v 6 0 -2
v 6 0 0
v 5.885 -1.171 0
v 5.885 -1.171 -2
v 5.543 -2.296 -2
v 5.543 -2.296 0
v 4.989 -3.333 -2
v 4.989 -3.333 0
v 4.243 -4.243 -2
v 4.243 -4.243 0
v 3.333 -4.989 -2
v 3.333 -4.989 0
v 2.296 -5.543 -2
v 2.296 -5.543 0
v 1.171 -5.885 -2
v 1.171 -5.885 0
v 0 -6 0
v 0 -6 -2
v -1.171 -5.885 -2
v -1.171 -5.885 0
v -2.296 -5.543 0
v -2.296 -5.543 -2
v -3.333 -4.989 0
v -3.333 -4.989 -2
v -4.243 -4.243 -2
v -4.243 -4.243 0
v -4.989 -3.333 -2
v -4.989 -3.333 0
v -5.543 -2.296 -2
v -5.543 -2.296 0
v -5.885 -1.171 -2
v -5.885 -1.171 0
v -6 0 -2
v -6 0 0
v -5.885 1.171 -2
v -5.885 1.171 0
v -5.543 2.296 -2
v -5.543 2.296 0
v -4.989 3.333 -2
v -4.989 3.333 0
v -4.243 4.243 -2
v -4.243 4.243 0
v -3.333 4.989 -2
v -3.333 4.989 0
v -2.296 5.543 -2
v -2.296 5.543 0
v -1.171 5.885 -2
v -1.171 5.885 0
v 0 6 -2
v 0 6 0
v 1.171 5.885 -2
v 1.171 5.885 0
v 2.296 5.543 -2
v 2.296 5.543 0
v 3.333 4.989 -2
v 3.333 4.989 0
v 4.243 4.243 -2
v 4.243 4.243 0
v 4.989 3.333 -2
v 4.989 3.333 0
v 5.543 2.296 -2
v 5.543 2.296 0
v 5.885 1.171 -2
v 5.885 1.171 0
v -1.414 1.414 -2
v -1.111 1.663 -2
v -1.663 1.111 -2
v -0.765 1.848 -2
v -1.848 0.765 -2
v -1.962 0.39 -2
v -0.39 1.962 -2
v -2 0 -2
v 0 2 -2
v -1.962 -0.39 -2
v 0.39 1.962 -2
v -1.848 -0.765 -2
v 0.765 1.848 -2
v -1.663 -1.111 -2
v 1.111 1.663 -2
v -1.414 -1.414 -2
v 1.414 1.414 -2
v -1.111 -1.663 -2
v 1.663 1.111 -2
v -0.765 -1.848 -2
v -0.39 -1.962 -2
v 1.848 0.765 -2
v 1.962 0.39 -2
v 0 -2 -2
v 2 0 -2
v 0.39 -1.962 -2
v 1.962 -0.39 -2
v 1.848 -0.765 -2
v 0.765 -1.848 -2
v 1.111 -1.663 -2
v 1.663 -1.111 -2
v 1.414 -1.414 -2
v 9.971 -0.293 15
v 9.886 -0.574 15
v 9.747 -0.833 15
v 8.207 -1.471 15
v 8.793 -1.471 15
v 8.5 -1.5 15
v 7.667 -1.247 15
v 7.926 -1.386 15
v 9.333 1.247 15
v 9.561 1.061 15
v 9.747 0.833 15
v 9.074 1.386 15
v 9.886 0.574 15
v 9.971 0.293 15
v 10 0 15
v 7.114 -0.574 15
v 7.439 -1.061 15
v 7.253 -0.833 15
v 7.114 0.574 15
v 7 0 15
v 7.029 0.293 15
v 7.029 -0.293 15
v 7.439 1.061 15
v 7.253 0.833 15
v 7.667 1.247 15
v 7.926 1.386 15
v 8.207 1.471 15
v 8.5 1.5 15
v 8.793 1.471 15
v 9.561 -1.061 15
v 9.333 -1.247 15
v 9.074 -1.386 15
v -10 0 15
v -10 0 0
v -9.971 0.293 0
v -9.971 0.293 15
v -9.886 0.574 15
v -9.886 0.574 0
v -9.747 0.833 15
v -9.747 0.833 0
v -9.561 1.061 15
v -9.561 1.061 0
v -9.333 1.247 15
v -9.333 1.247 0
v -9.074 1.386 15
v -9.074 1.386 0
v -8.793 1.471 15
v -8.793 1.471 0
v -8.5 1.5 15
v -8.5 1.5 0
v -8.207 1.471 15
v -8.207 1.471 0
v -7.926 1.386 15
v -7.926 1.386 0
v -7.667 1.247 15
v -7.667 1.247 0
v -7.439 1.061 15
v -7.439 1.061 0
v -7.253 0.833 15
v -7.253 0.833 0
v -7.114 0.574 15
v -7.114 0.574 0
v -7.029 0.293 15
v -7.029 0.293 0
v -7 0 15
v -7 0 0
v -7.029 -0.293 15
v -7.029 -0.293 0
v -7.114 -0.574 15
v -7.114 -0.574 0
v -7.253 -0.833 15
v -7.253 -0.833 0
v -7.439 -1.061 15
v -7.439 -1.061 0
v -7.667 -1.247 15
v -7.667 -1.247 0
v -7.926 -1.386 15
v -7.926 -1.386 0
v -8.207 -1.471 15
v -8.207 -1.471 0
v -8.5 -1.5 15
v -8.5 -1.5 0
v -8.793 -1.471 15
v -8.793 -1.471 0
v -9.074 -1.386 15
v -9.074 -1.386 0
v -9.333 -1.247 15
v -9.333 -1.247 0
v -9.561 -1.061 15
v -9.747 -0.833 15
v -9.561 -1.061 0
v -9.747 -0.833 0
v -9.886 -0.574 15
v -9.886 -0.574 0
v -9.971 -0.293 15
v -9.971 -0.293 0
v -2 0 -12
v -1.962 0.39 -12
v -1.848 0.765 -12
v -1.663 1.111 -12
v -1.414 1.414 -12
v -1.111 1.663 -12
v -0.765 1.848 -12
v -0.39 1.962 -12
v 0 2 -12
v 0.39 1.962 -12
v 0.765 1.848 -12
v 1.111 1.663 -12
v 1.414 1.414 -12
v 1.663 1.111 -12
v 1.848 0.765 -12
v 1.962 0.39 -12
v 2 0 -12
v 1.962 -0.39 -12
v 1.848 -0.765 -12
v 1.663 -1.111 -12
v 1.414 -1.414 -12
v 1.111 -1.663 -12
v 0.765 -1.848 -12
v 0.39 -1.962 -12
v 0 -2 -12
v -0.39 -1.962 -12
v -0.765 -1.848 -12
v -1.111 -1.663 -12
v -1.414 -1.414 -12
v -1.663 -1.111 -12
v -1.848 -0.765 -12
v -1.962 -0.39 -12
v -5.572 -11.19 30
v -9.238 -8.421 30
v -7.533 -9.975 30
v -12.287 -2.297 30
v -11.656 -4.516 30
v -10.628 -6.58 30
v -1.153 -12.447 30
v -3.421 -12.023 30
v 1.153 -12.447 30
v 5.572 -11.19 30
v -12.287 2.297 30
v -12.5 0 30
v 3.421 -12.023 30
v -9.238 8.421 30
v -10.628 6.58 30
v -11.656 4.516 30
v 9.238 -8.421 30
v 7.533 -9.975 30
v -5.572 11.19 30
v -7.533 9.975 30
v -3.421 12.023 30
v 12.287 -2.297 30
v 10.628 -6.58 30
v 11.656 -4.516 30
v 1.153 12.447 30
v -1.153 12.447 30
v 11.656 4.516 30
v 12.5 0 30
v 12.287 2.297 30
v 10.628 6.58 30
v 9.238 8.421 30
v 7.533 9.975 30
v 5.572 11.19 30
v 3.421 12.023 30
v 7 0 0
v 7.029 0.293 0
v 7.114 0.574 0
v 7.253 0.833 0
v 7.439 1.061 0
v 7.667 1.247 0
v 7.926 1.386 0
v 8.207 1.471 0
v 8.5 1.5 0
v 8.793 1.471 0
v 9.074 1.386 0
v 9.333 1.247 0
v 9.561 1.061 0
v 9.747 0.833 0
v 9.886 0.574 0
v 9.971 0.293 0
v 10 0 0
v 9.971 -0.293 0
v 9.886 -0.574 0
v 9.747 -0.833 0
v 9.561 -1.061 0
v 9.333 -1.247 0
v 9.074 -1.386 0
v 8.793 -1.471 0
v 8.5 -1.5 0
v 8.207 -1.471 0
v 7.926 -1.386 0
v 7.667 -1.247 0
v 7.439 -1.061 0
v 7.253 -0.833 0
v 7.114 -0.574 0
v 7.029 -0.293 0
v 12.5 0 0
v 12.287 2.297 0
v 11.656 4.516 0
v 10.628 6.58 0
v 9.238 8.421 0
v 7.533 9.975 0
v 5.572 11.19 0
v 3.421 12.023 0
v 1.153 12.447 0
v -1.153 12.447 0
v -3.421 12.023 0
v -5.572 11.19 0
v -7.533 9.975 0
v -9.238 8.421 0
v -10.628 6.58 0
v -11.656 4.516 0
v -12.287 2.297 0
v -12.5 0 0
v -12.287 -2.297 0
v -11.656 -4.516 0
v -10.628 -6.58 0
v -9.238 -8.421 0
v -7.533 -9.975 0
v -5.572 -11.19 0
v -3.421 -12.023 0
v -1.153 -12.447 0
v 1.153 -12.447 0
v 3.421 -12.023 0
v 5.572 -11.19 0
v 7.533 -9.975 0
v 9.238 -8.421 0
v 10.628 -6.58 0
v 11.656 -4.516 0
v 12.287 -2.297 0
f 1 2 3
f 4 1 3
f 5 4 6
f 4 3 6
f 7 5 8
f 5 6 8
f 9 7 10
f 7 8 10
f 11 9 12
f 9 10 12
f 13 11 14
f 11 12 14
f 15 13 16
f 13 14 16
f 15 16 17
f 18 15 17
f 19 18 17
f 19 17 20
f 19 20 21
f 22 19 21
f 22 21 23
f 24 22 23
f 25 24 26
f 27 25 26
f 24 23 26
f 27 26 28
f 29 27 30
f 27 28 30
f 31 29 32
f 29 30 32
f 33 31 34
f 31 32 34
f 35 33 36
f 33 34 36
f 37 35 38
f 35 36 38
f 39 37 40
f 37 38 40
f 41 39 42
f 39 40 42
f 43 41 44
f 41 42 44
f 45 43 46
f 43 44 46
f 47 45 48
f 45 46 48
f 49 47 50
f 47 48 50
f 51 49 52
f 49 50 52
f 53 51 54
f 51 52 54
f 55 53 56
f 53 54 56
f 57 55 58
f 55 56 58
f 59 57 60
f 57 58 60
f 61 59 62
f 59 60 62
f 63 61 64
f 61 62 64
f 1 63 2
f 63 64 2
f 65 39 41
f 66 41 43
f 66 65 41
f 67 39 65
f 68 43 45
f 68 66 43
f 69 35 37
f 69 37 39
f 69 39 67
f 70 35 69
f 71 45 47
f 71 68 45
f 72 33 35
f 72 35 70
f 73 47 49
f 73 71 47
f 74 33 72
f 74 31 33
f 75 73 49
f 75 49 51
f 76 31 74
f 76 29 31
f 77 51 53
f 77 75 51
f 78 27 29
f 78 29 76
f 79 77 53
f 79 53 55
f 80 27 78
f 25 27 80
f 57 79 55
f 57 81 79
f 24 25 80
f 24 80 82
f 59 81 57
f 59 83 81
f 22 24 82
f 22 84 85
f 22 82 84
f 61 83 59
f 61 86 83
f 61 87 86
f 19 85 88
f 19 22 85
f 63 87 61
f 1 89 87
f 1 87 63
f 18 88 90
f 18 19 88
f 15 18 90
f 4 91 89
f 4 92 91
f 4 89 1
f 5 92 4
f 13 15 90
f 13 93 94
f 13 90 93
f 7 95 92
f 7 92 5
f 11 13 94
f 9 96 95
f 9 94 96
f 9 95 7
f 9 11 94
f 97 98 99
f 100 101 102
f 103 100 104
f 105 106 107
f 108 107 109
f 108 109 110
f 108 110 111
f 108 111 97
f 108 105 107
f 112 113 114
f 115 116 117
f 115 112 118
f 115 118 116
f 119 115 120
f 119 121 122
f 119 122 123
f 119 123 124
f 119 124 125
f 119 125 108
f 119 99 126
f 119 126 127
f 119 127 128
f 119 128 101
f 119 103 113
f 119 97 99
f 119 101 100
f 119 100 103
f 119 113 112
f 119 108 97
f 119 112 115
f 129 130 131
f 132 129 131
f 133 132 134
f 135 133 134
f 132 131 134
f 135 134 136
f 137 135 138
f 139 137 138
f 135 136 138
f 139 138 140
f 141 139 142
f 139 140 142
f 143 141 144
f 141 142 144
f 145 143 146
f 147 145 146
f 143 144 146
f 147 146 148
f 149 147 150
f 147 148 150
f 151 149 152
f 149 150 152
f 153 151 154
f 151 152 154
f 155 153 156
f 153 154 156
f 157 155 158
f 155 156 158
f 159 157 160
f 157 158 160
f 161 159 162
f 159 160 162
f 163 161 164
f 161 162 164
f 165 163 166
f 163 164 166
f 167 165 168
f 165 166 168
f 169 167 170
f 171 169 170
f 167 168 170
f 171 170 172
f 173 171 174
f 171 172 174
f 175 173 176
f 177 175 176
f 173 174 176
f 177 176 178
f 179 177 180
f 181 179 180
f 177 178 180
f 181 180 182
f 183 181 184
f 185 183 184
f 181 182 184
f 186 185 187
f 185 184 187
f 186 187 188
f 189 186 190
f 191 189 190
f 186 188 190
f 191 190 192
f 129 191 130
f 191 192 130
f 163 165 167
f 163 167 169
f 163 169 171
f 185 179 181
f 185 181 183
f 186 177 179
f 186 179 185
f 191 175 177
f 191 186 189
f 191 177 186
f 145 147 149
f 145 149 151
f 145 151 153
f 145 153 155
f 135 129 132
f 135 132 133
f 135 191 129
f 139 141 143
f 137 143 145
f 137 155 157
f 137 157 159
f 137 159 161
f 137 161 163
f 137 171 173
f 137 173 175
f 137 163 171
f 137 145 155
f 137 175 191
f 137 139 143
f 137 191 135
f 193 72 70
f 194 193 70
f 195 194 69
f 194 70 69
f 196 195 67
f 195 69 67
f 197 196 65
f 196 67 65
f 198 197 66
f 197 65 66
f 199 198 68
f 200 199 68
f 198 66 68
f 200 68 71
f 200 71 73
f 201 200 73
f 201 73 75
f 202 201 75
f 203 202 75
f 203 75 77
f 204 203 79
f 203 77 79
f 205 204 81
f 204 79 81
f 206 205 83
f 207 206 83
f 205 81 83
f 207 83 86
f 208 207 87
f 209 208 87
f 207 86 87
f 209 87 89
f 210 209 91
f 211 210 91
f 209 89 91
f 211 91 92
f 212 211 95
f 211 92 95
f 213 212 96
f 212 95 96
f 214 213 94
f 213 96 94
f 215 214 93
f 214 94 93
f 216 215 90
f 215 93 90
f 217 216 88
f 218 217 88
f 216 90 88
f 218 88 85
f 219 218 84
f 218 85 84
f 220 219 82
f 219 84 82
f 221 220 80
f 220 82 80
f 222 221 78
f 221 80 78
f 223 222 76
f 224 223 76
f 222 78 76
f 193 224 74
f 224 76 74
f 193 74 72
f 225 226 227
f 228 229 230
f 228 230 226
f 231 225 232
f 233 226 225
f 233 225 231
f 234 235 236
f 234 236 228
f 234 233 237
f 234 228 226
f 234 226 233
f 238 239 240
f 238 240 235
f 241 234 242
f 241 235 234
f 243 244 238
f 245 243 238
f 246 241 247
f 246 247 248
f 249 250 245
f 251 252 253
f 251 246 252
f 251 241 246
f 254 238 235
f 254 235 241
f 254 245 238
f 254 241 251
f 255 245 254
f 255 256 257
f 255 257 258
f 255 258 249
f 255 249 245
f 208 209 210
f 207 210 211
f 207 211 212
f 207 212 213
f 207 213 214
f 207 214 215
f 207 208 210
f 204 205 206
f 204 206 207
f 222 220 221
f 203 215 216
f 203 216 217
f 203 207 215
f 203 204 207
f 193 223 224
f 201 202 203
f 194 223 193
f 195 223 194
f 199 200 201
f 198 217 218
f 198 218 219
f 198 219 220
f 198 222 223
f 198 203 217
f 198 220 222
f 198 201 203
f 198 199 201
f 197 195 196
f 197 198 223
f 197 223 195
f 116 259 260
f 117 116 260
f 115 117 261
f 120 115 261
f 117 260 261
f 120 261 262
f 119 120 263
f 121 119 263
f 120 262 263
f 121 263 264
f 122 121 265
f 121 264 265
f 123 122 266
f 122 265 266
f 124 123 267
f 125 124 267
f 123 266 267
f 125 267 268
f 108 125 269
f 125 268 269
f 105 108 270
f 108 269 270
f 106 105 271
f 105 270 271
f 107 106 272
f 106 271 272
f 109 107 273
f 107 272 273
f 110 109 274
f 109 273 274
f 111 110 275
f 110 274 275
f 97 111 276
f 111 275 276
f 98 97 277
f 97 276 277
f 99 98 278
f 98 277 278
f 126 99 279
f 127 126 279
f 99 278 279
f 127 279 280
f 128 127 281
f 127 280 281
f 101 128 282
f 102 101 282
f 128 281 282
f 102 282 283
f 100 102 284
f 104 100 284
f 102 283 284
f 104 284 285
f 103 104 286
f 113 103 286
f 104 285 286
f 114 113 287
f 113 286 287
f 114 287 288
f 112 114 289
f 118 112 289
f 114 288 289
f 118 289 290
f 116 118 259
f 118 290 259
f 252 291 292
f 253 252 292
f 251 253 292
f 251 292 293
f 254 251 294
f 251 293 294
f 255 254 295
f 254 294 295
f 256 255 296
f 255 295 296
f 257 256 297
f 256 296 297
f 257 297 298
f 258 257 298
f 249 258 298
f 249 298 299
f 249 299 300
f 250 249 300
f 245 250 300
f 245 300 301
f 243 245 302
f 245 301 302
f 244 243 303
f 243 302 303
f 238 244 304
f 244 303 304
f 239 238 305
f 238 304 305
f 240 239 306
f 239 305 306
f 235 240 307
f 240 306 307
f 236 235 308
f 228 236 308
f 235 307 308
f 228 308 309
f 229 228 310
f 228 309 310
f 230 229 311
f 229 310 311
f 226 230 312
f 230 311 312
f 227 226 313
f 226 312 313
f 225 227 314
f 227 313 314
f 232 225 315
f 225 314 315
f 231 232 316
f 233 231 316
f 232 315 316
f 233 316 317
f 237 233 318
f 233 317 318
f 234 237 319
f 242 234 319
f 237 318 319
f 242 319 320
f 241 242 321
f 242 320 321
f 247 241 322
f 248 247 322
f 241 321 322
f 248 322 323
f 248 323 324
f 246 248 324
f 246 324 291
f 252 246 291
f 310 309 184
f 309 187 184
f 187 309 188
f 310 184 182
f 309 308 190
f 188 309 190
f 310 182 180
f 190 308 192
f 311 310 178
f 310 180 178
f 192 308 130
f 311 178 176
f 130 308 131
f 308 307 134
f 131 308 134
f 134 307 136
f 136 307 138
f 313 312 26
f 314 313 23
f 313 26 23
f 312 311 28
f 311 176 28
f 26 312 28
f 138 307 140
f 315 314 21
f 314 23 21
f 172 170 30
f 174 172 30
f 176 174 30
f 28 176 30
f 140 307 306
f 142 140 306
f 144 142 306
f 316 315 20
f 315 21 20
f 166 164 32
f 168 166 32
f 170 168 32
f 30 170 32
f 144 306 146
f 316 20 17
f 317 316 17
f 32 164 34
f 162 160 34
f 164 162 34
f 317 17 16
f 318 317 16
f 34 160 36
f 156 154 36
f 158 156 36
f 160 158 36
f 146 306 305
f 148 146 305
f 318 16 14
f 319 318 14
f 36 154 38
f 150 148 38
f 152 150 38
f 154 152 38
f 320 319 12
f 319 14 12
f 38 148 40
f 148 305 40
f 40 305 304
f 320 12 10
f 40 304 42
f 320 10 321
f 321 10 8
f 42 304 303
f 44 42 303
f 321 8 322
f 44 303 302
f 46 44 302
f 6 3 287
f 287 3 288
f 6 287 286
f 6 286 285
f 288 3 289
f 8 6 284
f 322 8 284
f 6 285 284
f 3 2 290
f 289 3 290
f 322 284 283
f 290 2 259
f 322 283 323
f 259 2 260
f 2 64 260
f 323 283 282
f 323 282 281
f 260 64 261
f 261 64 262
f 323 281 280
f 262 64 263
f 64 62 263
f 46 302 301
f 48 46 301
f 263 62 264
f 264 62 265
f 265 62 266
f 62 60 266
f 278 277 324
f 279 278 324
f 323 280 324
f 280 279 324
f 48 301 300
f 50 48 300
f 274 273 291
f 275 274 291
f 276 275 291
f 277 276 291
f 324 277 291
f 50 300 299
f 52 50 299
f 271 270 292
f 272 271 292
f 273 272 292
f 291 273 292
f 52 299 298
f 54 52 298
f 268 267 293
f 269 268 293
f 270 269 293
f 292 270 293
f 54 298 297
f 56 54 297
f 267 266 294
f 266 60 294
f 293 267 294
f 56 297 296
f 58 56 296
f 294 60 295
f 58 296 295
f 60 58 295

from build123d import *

# Parameters (mm, degrees)
SKETCH_1_R          = 12.5
EXTRUDE_3_DEPTH     = 30
SKETCH_3_R          = 1.5
CUT_EXTRUDE_1_DEPTH = 15
SKETCH_4_R          = 6
EXTRUDE_4_DEPTH     = 2
SKETCH_5_R          = 2
EXTRUDE_5_DEPTH     = 10


with BuildPart() as part:
    # 草图1 → 凸台-拉伸3 (new body)
    with BuildSketch(Plane.XY):
        Circle(SKETCH_1_R)
    extrude(amount=EXTRUDE_3_DEPTH)

    # 草图3 → 切除-拉伸1 (cut)
    with BuildSketch(Plane(origin=(0, 0, 0), x_dir=(-1, 0, 0), z_dir=(0, 0, -1))):
        with Locations((8.5, 0)):
            Circle(SKETCH_3_R)
        with Locations((-8.5, 0)):
            Circle(SKETCH_3_R)
    extrude(amount=-CUT_EXTRUDE_1_DEPTH, mode=Mode.SUBTRACT)

    # 草图4 → 凸台-拉伸4 (add)
    with BuildSketch(Plane(origin=(0, 0, 0), x_dir=(-1, 0, 0), z_dir=(0, 0, -1))):
        with Locations(Location((0, 0, 0), (0, 0, 180))):
            Circle(SKETCH_4_R)
    extrude(amount=EXTRUDE_4_DEPTH)

    # 草图5 → 凸台-拉伸5 (add)
    with BuildSketch(Plane(origin=(0, 0, -2), x_dir=(-1, 0, 0), z_dir=(0, 0, -1))):
        Circle(SKETCH_5_R)
    extrude(amount=EXTRUDE_5_DEPTH)


solid = part.part
